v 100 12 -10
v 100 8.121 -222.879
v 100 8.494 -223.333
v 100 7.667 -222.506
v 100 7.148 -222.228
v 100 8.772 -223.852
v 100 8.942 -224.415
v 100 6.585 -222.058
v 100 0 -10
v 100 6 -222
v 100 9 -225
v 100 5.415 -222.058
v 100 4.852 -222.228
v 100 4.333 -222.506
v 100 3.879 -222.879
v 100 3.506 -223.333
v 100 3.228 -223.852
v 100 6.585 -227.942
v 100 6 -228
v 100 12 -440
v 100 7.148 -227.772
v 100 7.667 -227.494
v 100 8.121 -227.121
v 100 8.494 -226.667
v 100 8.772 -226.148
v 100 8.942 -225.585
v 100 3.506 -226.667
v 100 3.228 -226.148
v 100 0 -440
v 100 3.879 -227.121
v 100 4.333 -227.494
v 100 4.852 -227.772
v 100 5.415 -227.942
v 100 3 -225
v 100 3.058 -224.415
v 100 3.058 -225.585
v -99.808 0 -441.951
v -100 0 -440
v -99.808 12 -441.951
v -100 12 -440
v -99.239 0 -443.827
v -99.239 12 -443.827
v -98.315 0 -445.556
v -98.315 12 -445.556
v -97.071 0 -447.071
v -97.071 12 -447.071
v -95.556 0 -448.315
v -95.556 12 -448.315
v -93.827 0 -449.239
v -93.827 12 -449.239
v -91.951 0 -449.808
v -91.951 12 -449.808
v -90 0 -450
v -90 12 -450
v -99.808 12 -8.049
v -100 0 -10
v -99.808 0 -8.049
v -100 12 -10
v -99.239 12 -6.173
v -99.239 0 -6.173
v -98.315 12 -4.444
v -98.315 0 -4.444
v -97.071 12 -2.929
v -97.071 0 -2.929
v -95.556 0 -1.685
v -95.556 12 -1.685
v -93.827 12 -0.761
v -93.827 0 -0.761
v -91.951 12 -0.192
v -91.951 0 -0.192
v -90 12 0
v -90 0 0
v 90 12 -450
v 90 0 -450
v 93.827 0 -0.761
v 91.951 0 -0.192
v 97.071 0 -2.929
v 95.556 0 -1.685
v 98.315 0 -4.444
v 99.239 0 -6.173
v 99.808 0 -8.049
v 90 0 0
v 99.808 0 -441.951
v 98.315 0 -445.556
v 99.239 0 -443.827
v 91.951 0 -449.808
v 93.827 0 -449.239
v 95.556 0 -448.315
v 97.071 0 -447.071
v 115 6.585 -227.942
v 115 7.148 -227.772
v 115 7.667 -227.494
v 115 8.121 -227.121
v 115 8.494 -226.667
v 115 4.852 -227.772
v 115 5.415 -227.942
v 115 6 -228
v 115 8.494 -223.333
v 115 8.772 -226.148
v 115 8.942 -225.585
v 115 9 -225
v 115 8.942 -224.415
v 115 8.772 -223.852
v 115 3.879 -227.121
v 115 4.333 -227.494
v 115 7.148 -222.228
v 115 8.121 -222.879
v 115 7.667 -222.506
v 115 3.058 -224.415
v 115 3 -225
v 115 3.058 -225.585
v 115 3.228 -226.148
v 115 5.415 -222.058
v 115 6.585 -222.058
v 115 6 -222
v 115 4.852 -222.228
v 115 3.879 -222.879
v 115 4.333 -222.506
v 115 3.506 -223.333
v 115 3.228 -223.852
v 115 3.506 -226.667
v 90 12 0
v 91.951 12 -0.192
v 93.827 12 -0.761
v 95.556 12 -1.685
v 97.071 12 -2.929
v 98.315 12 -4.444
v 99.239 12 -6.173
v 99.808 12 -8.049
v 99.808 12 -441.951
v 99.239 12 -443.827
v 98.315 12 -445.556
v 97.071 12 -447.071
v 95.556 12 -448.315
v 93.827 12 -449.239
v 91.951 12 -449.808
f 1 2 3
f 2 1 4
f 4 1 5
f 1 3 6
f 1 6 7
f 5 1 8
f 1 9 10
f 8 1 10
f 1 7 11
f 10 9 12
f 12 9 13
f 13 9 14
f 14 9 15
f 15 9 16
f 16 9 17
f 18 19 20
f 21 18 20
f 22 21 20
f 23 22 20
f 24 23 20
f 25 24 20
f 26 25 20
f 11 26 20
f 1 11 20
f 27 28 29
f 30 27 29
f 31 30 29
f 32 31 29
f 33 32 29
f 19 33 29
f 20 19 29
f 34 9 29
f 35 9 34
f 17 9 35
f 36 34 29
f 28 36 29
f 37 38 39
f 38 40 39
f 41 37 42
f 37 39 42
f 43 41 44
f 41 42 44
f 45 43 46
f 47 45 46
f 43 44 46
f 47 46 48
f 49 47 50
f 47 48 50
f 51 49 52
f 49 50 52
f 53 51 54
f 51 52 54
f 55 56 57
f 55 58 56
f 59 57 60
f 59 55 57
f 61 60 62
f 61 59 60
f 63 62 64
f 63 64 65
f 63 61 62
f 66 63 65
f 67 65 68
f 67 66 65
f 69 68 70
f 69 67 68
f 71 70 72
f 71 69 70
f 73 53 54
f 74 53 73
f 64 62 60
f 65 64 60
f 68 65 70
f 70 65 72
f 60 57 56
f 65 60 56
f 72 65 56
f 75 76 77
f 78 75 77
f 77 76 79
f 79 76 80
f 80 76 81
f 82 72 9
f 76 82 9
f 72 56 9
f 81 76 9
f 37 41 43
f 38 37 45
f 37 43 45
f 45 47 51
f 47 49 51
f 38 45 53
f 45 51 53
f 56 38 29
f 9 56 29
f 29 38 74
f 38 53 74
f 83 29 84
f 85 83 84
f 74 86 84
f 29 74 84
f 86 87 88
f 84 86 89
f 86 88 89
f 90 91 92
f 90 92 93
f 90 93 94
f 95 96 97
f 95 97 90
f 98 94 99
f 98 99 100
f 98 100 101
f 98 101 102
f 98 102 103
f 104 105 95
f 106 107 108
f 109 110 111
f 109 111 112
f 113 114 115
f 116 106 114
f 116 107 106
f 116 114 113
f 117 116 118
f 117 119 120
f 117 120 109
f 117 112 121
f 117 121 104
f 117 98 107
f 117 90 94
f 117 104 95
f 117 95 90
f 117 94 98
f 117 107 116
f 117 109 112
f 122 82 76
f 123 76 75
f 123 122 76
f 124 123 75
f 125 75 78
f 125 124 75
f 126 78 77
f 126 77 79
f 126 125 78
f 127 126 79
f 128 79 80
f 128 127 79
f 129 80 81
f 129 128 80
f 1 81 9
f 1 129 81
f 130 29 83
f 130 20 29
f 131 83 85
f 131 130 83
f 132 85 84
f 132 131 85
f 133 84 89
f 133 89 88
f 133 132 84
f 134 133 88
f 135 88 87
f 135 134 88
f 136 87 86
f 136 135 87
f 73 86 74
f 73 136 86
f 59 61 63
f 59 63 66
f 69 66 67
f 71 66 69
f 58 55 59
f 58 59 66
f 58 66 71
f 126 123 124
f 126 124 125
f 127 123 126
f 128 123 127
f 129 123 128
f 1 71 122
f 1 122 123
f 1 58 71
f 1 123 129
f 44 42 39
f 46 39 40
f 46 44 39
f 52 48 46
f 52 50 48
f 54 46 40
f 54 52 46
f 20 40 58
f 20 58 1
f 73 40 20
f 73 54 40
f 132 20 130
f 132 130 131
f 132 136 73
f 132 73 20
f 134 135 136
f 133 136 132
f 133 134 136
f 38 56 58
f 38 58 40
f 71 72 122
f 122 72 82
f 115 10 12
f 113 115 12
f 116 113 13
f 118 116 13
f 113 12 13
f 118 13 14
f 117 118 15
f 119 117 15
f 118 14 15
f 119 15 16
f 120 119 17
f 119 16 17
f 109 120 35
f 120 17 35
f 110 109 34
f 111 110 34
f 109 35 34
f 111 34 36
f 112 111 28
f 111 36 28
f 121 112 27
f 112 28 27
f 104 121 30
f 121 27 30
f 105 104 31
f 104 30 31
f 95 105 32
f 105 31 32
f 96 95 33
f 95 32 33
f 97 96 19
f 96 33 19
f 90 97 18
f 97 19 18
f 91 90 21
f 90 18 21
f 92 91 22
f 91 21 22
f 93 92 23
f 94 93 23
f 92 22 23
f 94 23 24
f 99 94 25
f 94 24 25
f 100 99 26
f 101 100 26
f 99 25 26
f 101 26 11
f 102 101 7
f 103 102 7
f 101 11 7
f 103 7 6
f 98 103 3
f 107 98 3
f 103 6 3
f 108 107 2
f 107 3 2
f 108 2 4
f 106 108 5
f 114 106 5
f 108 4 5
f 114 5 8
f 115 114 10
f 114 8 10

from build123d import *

# Parameters (mm, degrees)
SKETCH_1_W      = 200
SKETCH_1_H      = 450
EXTRUDE_1_DEPTH = 12
FILLET_1_R      = 10
SKETCH_2_R      = 3
EXTRUDE_2_DEPTH = 15


with BuildPart() as part:
    # 草图1 → 凸台-拉伸1 (new body)
    with BuildSketch(Plane(origin=(0, 0, 0), x_dir=(1, 0, 0), z_dir=(0, 1, 0))):
        with Locations((0, 225)):
            Rectangle(SKETCH_1_W, SKETCH_1_H)
    extrude(amount=EXTRUDE_1_DEPTH)

    # 圆角1
    fillet_1_edges = [part.edges().sort_by_distance(p)[0] for p in [
        (-100, 6, -450),
        (100, 6, -450),
        (100, 6, 0),
        (-100, 6, 0),
    ]]
    fillet(fillet_1_edges, radius=FILLET_1_R)

    # 草图2 → 凸台-拉伸2 (add)
    with BuildSketch(Plane(origin=(100, 0, 0), x_dir=(0, 0, -1), z_dir=(1, 0, 0))):
        with Locations(Location((225, 6, 0), (0, 0, 180))):
            Circle(SKETCH_2_R)
    extrude(amount=EXTRUDE_2_DEPTH)


solid = part.part
